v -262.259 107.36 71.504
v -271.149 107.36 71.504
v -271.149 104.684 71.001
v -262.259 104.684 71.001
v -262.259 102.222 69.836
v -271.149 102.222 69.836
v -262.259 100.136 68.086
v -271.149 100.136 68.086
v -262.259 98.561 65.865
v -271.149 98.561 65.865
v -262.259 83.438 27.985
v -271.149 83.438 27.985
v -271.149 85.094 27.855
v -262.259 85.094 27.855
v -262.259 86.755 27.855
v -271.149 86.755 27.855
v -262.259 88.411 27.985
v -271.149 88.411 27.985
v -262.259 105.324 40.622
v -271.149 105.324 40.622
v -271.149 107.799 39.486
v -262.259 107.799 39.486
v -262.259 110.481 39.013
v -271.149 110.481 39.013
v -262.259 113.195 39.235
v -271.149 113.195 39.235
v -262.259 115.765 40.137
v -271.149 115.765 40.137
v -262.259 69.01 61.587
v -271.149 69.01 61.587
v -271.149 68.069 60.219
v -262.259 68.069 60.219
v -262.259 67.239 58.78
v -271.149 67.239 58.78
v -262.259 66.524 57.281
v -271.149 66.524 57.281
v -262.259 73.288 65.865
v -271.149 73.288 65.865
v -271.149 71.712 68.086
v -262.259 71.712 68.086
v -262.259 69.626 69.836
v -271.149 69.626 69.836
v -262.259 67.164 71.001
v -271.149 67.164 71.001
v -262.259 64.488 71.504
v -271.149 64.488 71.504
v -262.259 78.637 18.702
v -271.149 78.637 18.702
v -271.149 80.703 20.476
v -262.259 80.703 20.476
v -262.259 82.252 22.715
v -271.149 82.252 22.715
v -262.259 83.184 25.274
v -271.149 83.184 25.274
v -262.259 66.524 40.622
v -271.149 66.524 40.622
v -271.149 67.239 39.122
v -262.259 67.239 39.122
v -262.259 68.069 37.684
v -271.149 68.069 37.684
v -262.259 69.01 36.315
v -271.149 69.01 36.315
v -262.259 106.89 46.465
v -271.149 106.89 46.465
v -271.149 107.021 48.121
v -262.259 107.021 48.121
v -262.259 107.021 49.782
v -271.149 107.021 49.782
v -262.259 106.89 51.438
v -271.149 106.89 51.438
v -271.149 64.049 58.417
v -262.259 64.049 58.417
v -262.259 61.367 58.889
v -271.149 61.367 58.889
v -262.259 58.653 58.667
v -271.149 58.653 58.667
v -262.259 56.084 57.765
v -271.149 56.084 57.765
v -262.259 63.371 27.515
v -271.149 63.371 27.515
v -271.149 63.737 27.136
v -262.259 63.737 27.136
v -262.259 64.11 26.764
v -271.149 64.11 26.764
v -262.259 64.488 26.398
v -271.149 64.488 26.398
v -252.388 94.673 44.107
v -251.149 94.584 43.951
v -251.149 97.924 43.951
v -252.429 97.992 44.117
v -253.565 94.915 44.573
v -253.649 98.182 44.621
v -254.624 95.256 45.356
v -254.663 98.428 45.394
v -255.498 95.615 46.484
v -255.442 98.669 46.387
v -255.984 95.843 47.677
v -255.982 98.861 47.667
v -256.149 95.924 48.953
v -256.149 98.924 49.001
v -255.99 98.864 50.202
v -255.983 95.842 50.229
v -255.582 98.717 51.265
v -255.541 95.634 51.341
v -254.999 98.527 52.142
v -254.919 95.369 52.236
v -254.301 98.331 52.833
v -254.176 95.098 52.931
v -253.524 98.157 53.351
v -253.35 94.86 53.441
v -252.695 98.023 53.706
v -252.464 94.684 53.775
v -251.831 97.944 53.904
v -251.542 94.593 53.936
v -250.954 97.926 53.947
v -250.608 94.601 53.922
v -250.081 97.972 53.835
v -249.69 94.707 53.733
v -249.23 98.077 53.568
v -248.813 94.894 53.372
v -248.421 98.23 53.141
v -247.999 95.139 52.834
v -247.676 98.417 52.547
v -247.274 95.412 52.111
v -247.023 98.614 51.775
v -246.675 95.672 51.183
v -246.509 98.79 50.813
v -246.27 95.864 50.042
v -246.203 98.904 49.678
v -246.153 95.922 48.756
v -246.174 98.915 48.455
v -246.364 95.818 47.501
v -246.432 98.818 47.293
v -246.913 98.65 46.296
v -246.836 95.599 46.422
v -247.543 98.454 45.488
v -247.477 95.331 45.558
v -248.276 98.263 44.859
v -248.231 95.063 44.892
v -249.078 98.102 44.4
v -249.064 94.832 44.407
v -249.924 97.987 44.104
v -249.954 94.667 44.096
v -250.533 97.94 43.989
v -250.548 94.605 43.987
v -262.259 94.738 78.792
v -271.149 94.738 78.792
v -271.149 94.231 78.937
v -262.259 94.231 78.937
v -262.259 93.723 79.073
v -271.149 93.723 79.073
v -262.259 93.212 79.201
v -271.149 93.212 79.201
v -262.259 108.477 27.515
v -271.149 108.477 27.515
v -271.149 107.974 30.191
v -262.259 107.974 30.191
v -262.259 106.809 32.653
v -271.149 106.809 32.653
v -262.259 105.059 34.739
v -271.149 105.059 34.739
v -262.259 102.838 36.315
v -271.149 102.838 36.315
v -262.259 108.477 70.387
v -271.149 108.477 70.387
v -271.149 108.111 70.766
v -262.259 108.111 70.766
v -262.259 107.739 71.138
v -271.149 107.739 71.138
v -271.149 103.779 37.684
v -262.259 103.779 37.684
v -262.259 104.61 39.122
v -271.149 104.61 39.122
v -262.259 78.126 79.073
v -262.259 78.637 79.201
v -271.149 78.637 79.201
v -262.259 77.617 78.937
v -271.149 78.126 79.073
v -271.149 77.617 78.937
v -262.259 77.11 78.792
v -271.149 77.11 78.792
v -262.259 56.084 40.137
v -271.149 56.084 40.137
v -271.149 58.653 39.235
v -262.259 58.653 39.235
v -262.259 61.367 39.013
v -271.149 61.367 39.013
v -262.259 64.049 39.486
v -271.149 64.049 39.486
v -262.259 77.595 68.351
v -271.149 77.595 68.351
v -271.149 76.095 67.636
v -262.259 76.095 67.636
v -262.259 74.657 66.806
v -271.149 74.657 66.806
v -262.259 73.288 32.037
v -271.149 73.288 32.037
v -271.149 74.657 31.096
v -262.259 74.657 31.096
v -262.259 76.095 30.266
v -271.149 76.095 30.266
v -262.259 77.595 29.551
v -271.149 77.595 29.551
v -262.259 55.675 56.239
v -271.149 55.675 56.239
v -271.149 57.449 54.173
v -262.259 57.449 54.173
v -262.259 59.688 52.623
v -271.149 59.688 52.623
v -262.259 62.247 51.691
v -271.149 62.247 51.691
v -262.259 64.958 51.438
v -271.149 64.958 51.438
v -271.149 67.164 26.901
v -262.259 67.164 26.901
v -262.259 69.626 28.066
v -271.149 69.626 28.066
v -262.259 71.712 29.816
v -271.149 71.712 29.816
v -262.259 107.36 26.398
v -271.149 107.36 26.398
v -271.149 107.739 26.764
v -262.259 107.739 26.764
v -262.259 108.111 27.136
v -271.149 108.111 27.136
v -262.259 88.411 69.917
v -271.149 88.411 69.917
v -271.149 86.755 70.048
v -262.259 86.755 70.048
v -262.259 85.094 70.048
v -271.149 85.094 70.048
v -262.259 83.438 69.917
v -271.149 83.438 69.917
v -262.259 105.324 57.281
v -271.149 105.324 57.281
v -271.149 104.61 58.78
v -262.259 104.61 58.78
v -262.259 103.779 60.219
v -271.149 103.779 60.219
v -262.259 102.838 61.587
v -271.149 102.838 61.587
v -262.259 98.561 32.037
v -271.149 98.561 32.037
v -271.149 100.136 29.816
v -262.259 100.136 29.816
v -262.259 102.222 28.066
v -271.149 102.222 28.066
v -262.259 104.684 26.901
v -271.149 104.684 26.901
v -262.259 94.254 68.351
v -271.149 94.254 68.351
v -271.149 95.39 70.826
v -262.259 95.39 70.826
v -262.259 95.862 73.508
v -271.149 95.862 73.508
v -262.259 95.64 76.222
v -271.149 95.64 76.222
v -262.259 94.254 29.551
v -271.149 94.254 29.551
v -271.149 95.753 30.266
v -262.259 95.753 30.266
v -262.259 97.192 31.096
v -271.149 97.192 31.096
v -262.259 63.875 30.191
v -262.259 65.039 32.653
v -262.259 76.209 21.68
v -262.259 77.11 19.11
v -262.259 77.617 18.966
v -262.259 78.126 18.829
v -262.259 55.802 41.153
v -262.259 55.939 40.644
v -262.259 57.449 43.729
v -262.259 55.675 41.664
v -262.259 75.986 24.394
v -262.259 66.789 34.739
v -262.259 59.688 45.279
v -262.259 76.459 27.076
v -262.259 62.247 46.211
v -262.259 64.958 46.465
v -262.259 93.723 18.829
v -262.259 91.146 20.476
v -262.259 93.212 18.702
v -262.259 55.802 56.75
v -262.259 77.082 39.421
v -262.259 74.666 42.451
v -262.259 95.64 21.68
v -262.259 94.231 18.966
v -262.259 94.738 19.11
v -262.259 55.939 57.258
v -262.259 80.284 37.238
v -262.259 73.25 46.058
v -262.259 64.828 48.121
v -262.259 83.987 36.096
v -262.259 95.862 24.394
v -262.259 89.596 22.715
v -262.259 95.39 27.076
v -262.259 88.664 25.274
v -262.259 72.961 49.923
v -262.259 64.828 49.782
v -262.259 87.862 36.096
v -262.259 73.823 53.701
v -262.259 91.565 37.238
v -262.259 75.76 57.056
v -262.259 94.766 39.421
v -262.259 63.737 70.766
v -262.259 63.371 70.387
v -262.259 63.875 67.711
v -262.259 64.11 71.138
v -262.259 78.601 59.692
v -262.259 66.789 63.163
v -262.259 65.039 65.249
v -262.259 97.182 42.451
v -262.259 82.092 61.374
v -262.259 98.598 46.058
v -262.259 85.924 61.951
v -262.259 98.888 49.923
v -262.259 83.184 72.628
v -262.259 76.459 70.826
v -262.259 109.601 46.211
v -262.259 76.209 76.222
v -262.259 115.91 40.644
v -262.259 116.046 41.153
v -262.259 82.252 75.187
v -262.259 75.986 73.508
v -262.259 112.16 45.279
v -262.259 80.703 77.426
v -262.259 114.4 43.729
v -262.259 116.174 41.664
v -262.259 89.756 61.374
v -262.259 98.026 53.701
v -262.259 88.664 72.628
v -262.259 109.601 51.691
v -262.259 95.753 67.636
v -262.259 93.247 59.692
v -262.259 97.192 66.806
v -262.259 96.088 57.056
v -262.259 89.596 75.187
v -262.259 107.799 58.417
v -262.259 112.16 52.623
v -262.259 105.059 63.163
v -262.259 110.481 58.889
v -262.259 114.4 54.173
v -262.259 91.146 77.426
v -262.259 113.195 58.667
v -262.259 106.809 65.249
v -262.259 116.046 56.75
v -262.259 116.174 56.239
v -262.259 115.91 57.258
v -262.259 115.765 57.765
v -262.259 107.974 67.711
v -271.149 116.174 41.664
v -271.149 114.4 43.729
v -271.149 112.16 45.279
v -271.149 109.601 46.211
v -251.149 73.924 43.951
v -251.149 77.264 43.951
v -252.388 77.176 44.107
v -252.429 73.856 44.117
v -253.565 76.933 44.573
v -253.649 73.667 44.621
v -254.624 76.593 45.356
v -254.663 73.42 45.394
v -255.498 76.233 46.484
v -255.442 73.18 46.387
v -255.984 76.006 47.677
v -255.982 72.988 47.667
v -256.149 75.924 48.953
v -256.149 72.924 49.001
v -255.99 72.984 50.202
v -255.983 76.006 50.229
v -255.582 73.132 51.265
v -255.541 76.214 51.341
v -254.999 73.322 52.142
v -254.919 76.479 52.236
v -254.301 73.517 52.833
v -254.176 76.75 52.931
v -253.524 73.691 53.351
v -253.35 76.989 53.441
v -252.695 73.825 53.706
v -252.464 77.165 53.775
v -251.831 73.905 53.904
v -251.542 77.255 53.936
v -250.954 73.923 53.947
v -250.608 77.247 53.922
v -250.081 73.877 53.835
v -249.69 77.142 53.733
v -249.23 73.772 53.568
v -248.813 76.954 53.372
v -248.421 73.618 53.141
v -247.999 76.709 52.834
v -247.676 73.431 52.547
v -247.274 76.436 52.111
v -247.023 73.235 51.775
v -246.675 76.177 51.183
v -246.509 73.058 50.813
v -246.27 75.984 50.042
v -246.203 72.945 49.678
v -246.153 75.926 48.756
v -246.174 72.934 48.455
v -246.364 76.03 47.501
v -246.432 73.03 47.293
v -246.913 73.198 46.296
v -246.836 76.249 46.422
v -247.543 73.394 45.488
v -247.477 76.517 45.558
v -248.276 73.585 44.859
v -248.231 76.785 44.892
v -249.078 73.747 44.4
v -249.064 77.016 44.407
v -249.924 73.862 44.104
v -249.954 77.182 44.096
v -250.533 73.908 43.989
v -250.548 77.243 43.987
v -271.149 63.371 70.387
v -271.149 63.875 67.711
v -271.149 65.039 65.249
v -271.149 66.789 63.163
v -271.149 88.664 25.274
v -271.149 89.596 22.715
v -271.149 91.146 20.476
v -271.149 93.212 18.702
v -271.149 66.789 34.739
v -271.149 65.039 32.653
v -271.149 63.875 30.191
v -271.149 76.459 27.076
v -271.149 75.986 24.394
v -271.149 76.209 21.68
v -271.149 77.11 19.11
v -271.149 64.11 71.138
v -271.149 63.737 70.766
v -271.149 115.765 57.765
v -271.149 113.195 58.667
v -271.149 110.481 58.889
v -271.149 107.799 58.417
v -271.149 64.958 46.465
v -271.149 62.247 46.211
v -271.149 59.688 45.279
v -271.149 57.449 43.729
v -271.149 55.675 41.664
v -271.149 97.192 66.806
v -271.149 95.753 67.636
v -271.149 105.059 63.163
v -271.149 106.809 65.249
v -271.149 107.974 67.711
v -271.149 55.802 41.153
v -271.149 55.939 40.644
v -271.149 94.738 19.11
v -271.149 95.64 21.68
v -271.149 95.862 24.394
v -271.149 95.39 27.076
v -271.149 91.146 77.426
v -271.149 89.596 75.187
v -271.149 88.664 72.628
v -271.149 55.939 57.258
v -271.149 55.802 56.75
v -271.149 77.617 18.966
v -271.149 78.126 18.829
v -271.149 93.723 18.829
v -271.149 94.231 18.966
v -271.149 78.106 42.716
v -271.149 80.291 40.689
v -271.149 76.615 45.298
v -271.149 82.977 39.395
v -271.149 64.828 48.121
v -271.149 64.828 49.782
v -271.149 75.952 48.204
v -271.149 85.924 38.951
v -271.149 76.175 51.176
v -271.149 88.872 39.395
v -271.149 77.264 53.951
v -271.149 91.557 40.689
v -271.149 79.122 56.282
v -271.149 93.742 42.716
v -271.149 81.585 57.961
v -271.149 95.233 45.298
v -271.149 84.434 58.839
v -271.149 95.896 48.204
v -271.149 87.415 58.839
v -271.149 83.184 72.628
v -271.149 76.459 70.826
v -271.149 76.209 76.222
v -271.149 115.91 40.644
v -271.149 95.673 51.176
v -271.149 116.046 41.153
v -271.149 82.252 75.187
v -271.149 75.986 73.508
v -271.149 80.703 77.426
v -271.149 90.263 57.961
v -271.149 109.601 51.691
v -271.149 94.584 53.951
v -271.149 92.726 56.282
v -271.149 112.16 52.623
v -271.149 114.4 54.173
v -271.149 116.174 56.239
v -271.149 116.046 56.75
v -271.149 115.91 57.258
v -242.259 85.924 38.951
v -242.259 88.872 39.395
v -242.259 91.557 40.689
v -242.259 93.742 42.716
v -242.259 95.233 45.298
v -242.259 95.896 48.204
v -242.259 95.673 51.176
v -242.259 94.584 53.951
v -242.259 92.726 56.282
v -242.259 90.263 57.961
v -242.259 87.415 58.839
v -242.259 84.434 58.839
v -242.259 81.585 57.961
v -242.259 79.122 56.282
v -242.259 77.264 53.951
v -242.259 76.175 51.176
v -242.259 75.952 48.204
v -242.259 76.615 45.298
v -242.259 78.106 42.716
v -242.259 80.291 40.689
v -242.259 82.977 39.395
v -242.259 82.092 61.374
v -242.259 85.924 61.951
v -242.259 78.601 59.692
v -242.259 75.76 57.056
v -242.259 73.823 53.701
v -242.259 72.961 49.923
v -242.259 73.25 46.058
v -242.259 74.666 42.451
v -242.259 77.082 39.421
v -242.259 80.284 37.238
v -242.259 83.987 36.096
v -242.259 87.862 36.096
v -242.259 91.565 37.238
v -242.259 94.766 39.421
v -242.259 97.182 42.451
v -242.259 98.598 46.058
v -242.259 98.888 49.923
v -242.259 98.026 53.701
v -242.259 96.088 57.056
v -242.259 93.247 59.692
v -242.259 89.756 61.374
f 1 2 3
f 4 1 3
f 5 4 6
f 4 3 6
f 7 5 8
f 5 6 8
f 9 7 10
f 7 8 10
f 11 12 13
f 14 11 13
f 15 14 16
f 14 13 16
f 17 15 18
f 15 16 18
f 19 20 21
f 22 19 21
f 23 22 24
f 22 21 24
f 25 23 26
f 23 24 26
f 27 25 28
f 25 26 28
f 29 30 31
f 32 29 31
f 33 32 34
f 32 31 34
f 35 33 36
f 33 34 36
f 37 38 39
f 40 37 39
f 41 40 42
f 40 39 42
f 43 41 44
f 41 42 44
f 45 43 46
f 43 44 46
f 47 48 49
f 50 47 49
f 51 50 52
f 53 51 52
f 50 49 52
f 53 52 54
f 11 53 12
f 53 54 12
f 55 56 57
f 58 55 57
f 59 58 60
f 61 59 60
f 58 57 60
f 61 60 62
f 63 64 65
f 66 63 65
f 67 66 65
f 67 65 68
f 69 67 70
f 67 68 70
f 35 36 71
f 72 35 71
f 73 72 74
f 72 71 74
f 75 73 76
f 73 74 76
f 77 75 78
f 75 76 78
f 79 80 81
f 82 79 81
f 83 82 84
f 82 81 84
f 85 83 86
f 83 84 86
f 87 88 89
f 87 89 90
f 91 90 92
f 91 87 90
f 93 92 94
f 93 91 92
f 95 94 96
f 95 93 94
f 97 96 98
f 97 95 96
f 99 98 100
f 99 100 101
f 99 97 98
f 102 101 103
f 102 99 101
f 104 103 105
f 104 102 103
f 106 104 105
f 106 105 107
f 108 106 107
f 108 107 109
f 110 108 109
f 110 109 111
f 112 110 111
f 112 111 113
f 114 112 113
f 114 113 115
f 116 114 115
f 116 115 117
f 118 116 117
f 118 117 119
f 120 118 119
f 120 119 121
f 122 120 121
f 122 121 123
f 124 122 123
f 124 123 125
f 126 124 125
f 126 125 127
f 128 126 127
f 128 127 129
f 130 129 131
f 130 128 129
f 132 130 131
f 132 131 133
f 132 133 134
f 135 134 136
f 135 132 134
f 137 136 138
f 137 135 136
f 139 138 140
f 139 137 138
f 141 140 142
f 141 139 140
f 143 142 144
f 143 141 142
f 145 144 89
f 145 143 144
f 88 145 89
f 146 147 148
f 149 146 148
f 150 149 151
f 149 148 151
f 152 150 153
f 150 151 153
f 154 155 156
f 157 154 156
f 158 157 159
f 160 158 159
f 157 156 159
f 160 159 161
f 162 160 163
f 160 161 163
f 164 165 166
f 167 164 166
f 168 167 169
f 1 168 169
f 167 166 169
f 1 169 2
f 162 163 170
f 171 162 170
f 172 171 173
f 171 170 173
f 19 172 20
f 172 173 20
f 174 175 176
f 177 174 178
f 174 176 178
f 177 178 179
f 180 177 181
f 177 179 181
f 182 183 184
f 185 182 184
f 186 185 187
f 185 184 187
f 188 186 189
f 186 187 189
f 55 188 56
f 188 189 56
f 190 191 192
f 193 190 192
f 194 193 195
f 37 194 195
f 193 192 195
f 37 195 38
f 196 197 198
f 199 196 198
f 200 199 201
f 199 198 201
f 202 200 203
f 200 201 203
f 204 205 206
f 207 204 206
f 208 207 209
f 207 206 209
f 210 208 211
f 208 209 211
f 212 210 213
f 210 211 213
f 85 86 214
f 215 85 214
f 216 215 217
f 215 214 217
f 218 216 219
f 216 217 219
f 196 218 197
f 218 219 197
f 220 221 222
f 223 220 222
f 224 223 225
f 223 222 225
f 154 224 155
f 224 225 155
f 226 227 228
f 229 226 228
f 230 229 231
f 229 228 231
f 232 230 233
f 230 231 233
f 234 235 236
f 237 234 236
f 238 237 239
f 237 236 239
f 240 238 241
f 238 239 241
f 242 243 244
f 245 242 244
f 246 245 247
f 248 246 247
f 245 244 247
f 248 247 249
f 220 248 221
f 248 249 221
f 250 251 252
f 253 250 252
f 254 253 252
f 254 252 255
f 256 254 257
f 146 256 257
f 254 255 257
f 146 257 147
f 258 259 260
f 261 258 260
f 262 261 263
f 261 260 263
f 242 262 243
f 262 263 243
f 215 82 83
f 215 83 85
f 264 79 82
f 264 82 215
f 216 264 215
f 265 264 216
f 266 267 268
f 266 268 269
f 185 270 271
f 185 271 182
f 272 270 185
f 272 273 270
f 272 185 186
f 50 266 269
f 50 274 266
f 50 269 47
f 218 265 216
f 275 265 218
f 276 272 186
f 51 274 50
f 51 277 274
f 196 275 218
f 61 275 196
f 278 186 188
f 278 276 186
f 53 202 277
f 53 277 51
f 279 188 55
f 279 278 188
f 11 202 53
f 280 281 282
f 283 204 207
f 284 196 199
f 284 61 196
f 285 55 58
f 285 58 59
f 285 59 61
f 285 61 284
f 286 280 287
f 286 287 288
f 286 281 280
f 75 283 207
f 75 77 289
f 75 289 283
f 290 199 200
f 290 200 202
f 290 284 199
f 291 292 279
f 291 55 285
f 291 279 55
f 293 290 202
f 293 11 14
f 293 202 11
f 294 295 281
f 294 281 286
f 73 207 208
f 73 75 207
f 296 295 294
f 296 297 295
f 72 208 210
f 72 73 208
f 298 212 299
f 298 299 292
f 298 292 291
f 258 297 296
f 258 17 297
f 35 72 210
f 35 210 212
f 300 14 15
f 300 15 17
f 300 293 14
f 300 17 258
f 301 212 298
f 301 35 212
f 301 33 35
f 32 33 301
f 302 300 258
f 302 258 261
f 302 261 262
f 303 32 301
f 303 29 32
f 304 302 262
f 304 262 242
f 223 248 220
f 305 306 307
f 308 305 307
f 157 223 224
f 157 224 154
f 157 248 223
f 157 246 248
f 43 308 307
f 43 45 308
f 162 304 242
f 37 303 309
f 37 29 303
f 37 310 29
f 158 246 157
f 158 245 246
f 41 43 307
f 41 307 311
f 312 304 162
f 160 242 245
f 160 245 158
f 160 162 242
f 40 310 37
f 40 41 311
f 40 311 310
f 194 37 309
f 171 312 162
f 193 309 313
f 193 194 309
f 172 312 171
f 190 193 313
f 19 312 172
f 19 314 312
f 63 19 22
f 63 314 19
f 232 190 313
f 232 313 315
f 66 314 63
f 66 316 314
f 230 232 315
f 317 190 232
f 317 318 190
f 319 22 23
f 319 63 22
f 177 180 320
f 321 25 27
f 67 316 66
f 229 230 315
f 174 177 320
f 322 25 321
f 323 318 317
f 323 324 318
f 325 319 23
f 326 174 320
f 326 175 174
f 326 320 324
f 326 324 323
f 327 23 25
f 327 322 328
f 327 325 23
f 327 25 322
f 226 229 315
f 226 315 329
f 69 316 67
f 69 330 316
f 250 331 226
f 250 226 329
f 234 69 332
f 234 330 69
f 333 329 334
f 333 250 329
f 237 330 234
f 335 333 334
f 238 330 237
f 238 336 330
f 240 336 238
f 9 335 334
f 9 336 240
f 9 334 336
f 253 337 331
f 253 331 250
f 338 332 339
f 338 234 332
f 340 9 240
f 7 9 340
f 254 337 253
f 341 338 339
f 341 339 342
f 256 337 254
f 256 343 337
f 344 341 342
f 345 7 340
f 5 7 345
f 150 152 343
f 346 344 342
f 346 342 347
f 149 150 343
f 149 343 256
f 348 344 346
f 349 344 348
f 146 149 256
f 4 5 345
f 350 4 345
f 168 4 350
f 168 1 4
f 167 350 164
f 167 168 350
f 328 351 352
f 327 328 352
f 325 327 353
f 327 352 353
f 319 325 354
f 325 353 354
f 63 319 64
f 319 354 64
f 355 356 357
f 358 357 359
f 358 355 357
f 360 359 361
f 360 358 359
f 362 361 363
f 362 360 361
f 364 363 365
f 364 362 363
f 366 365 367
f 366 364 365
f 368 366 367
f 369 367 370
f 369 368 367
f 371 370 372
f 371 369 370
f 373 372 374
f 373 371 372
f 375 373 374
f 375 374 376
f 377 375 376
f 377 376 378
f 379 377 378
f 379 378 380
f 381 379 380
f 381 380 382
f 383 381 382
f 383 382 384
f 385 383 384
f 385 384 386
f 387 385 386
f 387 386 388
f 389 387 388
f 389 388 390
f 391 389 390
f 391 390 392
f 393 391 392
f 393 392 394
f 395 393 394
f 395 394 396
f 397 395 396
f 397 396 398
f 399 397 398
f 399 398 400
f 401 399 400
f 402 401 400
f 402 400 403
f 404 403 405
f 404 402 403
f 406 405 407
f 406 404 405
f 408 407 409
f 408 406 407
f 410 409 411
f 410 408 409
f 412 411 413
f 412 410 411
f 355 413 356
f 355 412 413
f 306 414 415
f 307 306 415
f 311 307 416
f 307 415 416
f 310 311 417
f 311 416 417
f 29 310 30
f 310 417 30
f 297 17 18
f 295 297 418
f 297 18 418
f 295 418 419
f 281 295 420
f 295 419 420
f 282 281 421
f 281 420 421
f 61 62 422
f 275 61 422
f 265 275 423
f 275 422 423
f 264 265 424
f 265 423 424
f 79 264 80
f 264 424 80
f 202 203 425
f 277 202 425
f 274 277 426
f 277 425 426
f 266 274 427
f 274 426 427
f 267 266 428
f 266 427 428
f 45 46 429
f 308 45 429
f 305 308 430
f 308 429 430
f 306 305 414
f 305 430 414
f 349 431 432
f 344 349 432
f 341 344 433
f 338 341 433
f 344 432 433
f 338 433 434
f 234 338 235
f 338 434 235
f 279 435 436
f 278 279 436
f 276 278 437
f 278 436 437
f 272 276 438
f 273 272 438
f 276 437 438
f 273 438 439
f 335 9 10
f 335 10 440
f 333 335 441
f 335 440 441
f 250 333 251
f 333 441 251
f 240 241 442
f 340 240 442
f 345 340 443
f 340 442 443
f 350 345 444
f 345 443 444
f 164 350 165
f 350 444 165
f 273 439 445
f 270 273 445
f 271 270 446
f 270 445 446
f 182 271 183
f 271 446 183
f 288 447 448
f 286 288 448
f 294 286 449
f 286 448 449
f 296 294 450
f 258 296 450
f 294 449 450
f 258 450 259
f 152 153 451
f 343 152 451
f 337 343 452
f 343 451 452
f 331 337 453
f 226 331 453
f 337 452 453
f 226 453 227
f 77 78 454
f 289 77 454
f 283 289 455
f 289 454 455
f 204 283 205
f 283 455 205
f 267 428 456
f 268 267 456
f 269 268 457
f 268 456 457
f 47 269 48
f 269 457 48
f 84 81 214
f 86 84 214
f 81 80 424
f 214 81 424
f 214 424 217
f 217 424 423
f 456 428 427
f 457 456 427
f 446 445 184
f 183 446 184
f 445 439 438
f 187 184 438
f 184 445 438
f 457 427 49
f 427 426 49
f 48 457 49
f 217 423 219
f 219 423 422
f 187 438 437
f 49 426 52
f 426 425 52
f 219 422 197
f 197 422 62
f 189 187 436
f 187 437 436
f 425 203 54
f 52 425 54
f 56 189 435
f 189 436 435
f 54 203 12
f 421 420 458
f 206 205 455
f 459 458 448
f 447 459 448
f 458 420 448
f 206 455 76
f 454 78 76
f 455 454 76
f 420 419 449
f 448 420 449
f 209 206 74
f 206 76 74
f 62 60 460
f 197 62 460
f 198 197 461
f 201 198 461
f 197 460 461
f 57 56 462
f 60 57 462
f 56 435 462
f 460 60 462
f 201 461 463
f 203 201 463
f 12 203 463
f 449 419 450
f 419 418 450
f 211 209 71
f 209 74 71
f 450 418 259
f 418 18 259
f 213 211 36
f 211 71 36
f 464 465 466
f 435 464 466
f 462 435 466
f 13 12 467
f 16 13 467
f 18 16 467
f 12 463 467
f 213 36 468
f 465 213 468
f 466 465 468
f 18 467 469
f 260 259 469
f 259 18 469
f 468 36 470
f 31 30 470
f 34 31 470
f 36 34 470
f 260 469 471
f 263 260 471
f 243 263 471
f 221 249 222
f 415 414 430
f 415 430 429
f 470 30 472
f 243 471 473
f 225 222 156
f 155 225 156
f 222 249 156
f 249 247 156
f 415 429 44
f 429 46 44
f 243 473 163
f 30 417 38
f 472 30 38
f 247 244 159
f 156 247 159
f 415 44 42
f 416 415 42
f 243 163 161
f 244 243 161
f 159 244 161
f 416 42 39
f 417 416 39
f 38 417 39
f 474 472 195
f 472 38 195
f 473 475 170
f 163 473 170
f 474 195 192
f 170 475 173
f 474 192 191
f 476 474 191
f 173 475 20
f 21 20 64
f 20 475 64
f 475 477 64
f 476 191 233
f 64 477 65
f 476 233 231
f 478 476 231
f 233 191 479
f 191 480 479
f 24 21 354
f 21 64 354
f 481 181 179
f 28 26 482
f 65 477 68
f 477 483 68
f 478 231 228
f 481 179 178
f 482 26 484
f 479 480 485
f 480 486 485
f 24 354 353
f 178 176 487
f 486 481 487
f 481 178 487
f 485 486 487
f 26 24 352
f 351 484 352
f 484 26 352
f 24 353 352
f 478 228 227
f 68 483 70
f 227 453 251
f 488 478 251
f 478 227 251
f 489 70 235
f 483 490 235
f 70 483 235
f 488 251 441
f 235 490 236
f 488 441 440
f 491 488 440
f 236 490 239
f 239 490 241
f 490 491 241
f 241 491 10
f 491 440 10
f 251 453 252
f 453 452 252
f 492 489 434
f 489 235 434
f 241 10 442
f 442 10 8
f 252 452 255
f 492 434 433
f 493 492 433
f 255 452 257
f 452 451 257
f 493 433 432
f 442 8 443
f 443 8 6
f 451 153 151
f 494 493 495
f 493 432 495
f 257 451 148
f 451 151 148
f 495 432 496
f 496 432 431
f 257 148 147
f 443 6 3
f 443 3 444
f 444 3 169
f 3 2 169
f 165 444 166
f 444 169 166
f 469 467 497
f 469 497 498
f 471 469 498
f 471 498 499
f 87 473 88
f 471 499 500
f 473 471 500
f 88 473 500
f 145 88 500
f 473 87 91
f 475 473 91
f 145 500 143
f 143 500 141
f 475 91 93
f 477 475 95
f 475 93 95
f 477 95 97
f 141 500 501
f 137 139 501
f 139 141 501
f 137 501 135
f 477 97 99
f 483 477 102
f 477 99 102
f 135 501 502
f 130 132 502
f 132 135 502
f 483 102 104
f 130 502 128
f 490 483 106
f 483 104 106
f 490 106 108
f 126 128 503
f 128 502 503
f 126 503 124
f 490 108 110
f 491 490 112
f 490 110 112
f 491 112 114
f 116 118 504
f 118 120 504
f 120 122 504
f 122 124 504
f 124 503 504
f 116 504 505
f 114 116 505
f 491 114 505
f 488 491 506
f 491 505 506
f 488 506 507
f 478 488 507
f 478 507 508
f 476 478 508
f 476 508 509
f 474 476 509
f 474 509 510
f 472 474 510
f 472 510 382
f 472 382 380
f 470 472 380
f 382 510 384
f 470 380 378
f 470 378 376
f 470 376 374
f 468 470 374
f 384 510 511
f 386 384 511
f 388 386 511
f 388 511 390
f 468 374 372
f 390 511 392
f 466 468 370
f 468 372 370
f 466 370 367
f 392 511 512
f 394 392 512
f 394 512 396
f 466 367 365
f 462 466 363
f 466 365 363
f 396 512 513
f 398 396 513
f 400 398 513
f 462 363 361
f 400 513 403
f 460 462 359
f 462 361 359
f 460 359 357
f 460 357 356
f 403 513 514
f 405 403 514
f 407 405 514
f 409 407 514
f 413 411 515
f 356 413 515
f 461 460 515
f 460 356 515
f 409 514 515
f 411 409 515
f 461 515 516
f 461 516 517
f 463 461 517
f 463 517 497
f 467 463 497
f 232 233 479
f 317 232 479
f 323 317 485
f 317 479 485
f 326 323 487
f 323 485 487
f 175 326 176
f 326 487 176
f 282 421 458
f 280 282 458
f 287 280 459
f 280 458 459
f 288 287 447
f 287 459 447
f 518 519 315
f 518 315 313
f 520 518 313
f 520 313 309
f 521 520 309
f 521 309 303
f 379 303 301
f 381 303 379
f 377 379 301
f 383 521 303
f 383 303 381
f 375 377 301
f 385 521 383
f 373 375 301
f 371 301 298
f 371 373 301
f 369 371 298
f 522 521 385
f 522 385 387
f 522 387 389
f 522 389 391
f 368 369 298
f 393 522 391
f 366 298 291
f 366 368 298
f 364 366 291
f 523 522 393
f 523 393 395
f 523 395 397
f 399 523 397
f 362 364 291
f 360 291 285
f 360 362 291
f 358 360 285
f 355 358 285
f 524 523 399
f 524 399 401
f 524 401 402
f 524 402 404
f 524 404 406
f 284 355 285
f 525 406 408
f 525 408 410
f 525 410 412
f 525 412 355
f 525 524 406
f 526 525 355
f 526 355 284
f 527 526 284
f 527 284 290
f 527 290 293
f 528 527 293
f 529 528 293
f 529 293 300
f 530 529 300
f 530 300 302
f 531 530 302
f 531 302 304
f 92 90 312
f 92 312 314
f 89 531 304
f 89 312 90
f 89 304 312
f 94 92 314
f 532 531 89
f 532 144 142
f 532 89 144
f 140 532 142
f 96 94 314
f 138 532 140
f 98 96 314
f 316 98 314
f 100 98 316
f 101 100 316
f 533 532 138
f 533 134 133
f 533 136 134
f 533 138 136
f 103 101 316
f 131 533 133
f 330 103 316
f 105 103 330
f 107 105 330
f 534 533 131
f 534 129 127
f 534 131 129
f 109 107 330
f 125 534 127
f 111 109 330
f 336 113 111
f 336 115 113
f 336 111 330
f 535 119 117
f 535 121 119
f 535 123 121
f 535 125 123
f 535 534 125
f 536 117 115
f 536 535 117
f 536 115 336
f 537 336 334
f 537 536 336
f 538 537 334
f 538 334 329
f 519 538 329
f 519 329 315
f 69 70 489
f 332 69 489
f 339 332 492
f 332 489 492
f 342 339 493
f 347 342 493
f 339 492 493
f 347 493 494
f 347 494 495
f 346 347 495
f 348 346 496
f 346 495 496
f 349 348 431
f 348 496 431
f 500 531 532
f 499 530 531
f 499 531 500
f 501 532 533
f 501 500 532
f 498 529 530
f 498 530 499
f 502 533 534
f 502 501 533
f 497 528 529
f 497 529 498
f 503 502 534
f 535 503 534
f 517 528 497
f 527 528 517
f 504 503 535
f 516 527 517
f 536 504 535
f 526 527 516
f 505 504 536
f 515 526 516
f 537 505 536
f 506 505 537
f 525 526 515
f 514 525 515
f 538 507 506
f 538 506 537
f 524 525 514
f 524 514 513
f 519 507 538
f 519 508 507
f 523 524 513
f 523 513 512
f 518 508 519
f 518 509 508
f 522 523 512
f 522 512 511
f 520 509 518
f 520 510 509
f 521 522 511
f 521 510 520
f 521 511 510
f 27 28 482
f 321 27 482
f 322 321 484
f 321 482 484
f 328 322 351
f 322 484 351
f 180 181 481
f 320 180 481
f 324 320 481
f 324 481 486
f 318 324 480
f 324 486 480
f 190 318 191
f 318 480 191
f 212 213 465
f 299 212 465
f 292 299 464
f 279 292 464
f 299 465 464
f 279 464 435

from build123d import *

# Parameters (mm, degrees)
SPUR_START             = -273.054421635
SPUR_GEAR_AM_OUTLINE_R = 9.525
SPUR_GEAR_AM_DEPTH     = 12.7
SCALE2_SCALE           = 0.7
SKETCH5_R              = 10
CUT_EXTRUDE2_DEPTH     = 141.883332495
BOSS_EXTRUDE1_START    = 20
SKETCH7_R              = 13
SKETCH7_R_2            = 10
BOSS_EXTRUDE1_DEPTH    = 20
SKETCH8_R              = 5
CUT_EXTRUDE3_DEPTH     = 306.435901832


# Read off the part's stored shape, not the designer's step: spur gear_am
with BuildPart() as part:
    # spur gear_am outline → spur gear_am (new body)
    with BuildSketch(Plane.YZ.offset(SPUR_START)):
        with BuildLine():
            ThreePointArc((116.546862005, 16.732254346), (117.355063047, 17.520188248), (118.142996949, 18.32838929))
            ThreePointArc((118.142996949, 18.32838929), (115.759708054, 25.667921311), (110.086646287, 30.899093879))
            ThreePointArc((110.086646287, 30.899093879), (112.044558013, 33.870469671), (113.638889071, 37.05175886))
            ThreePointArc((113.638889071, 37.05175886), (121.00574829, 34.754329537), (128.553613919, 36.360106821))
            ThreePointArc((128.553613919, 36.360106821), (128.859569602, 37.446578117), (129.137839856, 38.540467701))
            ThreePointArc((129.137839856, 38.540467701), (123.404085119, 43.705044437), (115.875483227, 45.398841888))
            ThreePointArc((115.875483227, 45.398841888), (116.085396623, 48.951084671), (115.875483227, 52.503327455))
            ThreePointArc((115.875483227, 52.503327455), (123.404085118, 54.197124907), (129.137839856, 59.361701642))
            ThreePointArc((129.137839856, 59.361701642), (128.859569602, 60.455591227), (128.553613919, 61.542062523))
            ThreePointArc((128.553613919, 61.542062523), (121.00574829, 63.147839807), (113.638889071, 60.850410483))
            ThreePointArc((113.638889071, 60.850410483), (112.044558013, 64.031699672), (110.086646287, 67.003075464))
            ThreePointArc((110.086646287, 67.003075464), (115.759708054, 72.234248032), (118.142996949, 79.573780054))
            ThreePointArc((118.142996949, 79.573780054), (117.355063047, 80.381981095), (116.546862005, 81.169914997))
            ThreePointArc((116.546862005, 81.169914997), (109.207329984, 78.786626103), (103.976157416, 73.113564336))
            ThreePointArc((103.976157416, 73.113564336), (101.004781623, 75.071476061), (97.823492434, 76.665807119))
            ThreePointArc((97.823492434, 76.665807119), (100.120921758, 84.032666338), (98.515144474, 91.580531968))
            ThreePointArc((98.515144474, 91.580531968), (97.428673178, 91.88648765), (96.334783594, 92.164757905))
            ThreePointArc((96.334783594, 92.164757905), (91.170206858, 86.431003167), (89.476409406, 78.902401276))
            ThreePointArc((89.476409406, 78.902401276), (85.924166623, 79.112314672), (82.37192384, 78.902401276))
            ThreePointArc((82.37192384, 78.902401276), (80.678126388, 86.431003167), (75.513549653, 92.164757905))
            ThreePointArc((75.513549653, 92.164757905), (74.419660069, 91.88648765), (73.333188772, 91.580531968))
            ThreePointArc((73.333188772, 91.580531968), (71.727411488, 84.032666338), (74.024840812, 76.665807119))
            ThreePointArc((74.024840812, 76.665807119), (70.843551623, 75.071476061), (67.87217583, 73.113564336))
            ThreePointArc((67.87217583, 73.113564336), (62.641003263, 78.786626103), (55.301471241, 81.169914997))
            ThreePointArc((55.301471241, 81.169914997), (54.493270199, 80.381981096), (53.705336298, 79.573780054))
            ThreePointArc((53.705336298, 79.573780054), (56.088625192, 72.234248032), (61.761686959, 67.003075464))
            ThreePointArc((61.761686959, 67.003075464), (59.803775234, 64.031699671), (58.209444175, 60.850410483))
            ThreePointArc((58.209444175, 60.850410483), (50.842584956, 63.147839807), (43.294719327, 61.542062523))
            ThreePointArc((43.294719327, 61.542062523), (42.988763645, 60.455591226), (42.71049339, 59.361701642))
            ThreePointArc((42.71049339, 59.361701642), (48.444248128, 54.197124907), (55.972850019, 52.503327455))
            ThreePointArc((55.972850019, 52.503327455), (55.762936623, 48.951084671), (55.972850019, 45.398841888))
            ThreePointArc((55.972850019, 45.398841888), (48.444248127, 43.705044437), (42.71049339, 38.540467701))
            ThreePointArc((42.71049339, 38.540467701), (42.988763645, 37.446578117), (43.294719327, 36.360106821))
            ThreePointArc((43.294719327, 36.360106821), (50.842584956, 34.754329537), (58.209444175, 37.05175886))
            ThreePointArc((58.209444175, 37.05175886), (59.803775234, 33.870469672), (61.761686959, 30.899093879))
            ThreePointArc((61.761686959, 30.899093879), (56.088625192, 25.667921311), (53.705336298, 18.32838929))
            ThreePointArc((53.705336298, 18.32838929), (54.493270199, 17.520188248), (55.301471241, 16.732254346))
            ThreePointArc((55.301471241, 16.732254346), (62.641003263, 19.11554324), (67.87217583, 24.788605007))
            ThreePointArc((67.87217583, 24.788605007), (70.843551623, 22.830693282), (74.024840812, 21.236362224))
            ThreePointArc((74.024840812, 21.236362224), (71.727411488, 13.869503005), (73.333188772, 6.321637376))
            ThreePointArc((73.333188772, 6.321637376), (74.419660068, 6.015681693), (75.513549653, 5.737411439))
            ThreePointArc((75.513549653, 5.737411439), (80.678126388, 11.471166177), (82.37192384, 18.999768068))
            ThreePointArc((82.37192384, 18.999768068), (85.924166623, 18.789854672), (89.476409406, 18.999768068))
            ThreePointArc((89.476409406, 18.999768068), (91.170206858, 11.471166176), (96.334783594, 5.737411439))
            ThreePointArc((96.334783594, 5.737411439), (97.428673178, 6.015681693), (98.515144474, 6.321637376))
            ThreePointArc((98.515144474, 6.321637376), (100.120921758, 13.869503005), (97.823492434, 21.236362224))
            ThreePointArc((97.823492434, 21.236362224), (101.004781623, 22.830693282), (103.976157416, 24.788605007))
            ThreePointArc((103.976157416, 24.788605007), (109.207329984, 19.11554324), (116.546862005, 16.732254346))
        make_face()
        with Locations((85.924166623, 48.951084672)):
            Circle(SPUR_GEAR_AM_OUTLINE_R, mode=Mode.SUBTRACT)
    extrude(amount=SPUR_GEAR_AM_DEPTH)


with BuildPart() as part_1:
    # Scale2: scaled about (-266.704421635, 85.924166623, 48.951084672)
    add(part.part.scale(SCALE2_SCALE).moved(Location((-80.011326491, 25.777249987, 14.685325402))))

    # Sketch5 → Cut-Extrude2 (cut, through all)
    with BuildSketch(Plane(origin=(-262.259421635, 0, 0), x_dir=(0, 0, -1), z_dir=(1, 0, 0))):
        with Locations((-48.951084672, 85.924166623)):
            Circle(SKETCH5_R)
    extrude(amount=-CUT_EXTRUDE2_DEPTH, mode=Mode.SUBTRACT)

    # Sketch7 → Boss-Extrude1 (add)
    with BuildSketch(Plane(origin=(-262.259421635, 0, 0), x_dir=(0, 0, -1), z_dir=(1, 0, 0)).offset(BOSS_EXTRUDE1_START)):
        with Locations(Location((-48.951084672, 85.924166623, 0), (0, 0, 180))):
            Circle(SKETCH7_R)
        with Locations((-48.951084672, 85.924166623)):
            Circle(SKETCH7_R_2, mode=Mode.SUBTRACT)
    extrude(amount=-BOSS_EXTRUDE1_DEPTH)

    # Sketch8 → Cut-Extrude3 (cut, through all)
    with BuildSketch(Plane(origin=(0, 0, 0), x_dir=(1, 0, 0), z_dir=(0, 1, 0))):
        with Locations(Location((-251.149421635, -48.951084672, 0), (0, 0, 90))):
            Circle(SKETCH8_R)
    extrude(amount=CUT_EXTRUDE3_DEPTH, mode=Mode.SUBTRACT)


solid = part_1.part
